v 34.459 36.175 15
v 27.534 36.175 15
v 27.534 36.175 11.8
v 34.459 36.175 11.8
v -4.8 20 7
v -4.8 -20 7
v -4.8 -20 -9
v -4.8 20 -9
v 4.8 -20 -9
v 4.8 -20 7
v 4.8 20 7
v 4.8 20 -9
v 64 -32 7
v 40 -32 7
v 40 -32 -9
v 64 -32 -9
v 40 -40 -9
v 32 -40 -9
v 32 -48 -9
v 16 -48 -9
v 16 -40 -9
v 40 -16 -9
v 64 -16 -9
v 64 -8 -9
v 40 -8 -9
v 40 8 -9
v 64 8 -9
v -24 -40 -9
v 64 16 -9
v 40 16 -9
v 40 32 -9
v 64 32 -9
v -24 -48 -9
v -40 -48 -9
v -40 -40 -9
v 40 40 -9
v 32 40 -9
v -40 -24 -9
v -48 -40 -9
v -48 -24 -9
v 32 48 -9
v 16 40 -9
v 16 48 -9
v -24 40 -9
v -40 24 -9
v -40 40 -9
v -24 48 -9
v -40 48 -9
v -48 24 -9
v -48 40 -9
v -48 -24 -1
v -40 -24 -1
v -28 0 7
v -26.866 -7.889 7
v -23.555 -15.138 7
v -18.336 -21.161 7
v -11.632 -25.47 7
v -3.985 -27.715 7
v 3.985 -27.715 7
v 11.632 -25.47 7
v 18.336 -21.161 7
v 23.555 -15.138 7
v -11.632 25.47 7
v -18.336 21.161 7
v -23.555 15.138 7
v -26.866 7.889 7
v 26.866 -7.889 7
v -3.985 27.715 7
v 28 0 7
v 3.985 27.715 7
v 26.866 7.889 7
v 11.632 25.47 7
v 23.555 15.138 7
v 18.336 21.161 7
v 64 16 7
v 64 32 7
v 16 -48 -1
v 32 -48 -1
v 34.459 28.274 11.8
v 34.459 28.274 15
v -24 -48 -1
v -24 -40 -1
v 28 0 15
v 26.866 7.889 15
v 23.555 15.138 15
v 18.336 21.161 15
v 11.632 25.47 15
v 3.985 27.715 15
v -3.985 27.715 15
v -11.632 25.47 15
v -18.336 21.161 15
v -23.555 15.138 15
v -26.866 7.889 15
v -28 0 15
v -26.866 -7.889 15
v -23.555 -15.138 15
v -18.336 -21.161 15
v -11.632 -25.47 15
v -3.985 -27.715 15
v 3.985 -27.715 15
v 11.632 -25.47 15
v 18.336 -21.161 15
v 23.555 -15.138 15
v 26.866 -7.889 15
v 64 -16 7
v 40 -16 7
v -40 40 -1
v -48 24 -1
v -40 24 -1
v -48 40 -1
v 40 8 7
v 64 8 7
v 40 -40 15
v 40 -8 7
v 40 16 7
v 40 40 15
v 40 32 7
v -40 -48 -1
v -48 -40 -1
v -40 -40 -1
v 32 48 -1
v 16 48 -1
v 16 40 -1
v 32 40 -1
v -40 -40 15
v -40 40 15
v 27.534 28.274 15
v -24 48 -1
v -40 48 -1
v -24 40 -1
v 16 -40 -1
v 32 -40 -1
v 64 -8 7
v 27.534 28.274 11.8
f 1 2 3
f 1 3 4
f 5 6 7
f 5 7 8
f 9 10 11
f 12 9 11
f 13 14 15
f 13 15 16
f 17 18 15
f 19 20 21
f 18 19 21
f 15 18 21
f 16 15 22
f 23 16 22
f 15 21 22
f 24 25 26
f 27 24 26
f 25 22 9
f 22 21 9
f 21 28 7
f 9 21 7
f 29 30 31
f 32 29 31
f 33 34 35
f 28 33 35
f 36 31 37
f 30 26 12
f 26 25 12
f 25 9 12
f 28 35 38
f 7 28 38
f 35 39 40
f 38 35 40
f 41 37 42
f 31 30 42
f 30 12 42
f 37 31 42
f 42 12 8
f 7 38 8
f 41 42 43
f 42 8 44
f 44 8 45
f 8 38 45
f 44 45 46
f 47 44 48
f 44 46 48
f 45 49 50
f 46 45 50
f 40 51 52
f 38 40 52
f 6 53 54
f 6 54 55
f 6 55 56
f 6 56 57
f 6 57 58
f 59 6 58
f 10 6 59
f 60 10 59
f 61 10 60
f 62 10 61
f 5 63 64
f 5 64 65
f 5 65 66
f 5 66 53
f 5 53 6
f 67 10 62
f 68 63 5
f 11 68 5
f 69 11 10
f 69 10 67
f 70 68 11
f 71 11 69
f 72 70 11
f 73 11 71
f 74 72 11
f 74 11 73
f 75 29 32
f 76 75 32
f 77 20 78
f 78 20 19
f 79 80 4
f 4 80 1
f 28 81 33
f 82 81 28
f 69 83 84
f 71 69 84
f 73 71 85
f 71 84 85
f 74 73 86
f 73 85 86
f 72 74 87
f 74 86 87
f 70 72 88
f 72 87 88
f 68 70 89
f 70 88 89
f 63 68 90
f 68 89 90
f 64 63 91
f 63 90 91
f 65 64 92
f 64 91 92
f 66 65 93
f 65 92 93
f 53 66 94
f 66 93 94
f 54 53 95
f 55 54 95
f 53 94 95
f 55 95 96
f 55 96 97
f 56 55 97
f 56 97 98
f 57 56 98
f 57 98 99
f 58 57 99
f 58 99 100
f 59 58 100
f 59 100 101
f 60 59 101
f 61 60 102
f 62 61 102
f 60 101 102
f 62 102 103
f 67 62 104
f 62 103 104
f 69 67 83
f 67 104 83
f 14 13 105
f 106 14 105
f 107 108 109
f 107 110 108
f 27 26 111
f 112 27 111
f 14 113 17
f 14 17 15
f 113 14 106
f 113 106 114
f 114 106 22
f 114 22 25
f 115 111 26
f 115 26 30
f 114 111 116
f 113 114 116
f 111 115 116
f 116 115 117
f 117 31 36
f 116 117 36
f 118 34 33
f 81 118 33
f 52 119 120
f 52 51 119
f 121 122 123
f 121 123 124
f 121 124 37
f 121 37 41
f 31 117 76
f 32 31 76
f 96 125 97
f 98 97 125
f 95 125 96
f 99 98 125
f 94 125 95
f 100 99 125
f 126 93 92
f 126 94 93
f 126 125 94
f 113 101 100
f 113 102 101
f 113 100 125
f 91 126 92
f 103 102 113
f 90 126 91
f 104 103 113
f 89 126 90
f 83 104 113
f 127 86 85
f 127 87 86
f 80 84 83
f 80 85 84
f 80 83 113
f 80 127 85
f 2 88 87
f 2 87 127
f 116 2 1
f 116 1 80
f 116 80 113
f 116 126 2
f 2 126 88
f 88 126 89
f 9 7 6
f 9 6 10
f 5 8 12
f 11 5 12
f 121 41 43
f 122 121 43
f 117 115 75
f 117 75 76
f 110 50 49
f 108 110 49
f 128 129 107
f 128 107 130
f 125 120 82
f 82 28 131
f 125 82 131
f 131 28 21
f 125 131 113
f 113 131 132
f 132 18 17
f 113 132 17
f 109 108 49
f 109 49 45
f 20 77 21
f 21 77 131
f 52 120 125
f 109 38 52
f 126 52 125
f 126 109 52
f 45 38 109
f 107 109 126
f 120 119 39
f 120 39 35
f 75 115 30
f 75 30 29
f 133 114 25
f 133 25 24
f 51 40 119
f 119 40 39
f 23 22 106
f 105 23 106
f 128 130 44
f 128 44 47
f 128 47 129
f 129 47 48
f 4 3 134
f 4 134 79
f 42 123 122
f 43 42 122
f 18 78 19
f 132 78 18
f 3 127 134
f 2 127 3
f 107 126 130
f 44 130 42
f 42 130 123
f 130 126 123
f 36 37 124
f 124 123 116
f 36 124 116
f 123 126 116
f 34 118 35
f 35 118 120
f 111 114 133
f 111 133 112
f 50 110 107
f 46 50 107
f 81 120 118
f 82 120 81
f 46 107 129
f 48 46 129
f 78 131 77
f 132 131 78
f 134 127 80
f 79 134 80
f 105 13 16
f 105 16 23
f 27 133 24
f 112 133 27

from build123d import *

# Parameters (mm, degrees)
F0_W      = 50
F0_H      = 50
F1_DEPTH  = 15
F2_W      = 6
F2_H      = 25
F3_DEPTH  = 25
F4_W      = 10
F4_H      = 10
F5_DEPTH  = 30
F6_W      = 50
F6_H      = 20
F7_DEPTH  = 30
F9_DEPTH  = 50
F10_DEPTH = 5
F11_R     = 17.5
F11_W     = 6
F11_H     = 25
F12_DEPTH = 5
F11_W_2   = 25
F11_H_2   = 5.1409158856
F11_W_3   = 5
F11_H_3   = 5
F11_H_4   = 30
F13_DEPTH = 25
F14_W     = 6
F14_H     = 6
F15_DEPTH = 20
F16_DEPTH = 15
F11_W_4   = 4.3280106038
F11_H_5   = 4.9385428429
F17_DEPTH = 2
F18_W     = 60
F18_H     = 62
F19_DEPTH = 25
F20_SCALE = 1.6
F21_DEPTH = 4
F22_DEPTH = 4


with BuildPart() as f1:
    # F0 (on Top) → F1 (new body)
    with BuildSketch(Plane.XY):
        Rectangle(F0_W, F0_H)
    extrude(amount=F1_DEPTH)

    # F2 (on face) → F3 (cut)
    with BuildSketch(Plane.XY.offset(15)):
        Rectangle(F2_W, F2_H)
    extrude(amount=-F3_DEPTH, mode=Mode.SUBTRACT)

    # F4 (on face) → F5 (join)
    with BuildSketch(Plane.YZ.offset(25)):
        with Locations((0, 7.5)):
            Rectangle(F4_W, F4_H)
        with Locations((-15, 7.5)):
            Rectangle(F4_W, F4_H)
        with Locations((15, 7.5)):
            Rectangle(F4_W, F4_H)
    extrude(amount=F5_DEPTH)

    # F6 (on face) → F7 (join)
    with BuildSketch(Plane.YZ.offset(55)):
        with Locations((0, 7.5)):
            Rectangle(F6_W, F6_H)
    extrude(amount=F7_DEPTH)

    # F8 (on face) → F9 (cut)
    with BuildSketch(Plane(origin=(0, 25, 0), x_dir=(-1, 0, 0), z_dir=(0, 1, 0))):
        Polygon((-85, -2.5), (-70, 17.5), (-85, 17.5), align=None)
    extrude(amount=-F9_DEPTH, mode=Mode.SUBTRACT)

    # F0 (on Top) → F10 (join)
    with BuildSketch(Plane.XY):
        Polygon((-25, -25), (-25, 25), (25, 25), (25, 30), (-30, 30), (-30, -30), (25, -30), (25, -25), align=None)
    extrude(amount=F10_DEPTH)

    # F11 (on face) → F12 (cut)
    with BuildSketch(Plane.XY.offset(15)):
        Circle(F11_R)
        Rectangle(F11_W, F11_H, mode=Mode.SUBTRACT)
    extrude(amount=-F12_DEPTH, mode=Mode.SUBTRACT)

    # F11 (on face) → F13 (cut)
    with BuildSketch(Plane.XY.offset(15)):
        with Locations((-2.5, -27.5704579428)):
            Rectangle(F11_W_2, F11_H_2)
        with Locations((-27.5, -27.5704579428)):
            Rectangle(F11_W_3, F11_H_2)
        with Locations((22.5, -27.5704579428)):
            Rectangle(F11_W_3, F11_H_2)
        with Locations((22.5, 27.5)):
            Rectangle(F11_W_3, F11_H_3)
        with Locations((-2.5, 27.5)):
            Rectangle(F11_W_2, F11_H_3)
        with Locations((-27.5, 27.5)):
            Rectangle(F11_W_3, F11_H_3)
        with Locations((-27.5, 0)):
            Rectangle(F11_W_3, F11_H_4)
    extrude(amount=-F13_DEPTH, mode=Mode.SUBTRACT)

    # F14 (on face) → F15 (join)
    with BuildSketch(Plane.XY.offset(17.5)):
        with Locations((67, 28)):
            Rectangle(F14_W, F14_H)
        with Locations((67, -28)):
            Rectangle(F14_W, F14_H)
    extrude(amount=-F15_DEPTH)

    # F14 (on face) → F16 (cut)
    with BuildSketch(Plane.XY.offset(17.5)):
        with Locations((67, -28)):
            Rectangle(F14_W, F14_H)
        with Locations((67, 28)):
            Rectangle(F14_W, F14_H)
    extrude(amount=-F16_DEPTH, mode=Mode.SUBTRACT)

    # F11 (on face) → F17 (cut)
    with BuildSketch(Plane.XY.offset(15)):
        with Locations((19.372981973, 20.1403833926)):
            Rectangle(F11_W_4, F11_H_5)
    extrude(amount=-F17_DEPTH, mode=Mode.SUBTRACT)

    # F18 (on face) → F19 (cut)
    with BuildSketch(Plane.XY.offset(17.5)):
        with Locations((70, 0)):
            Rectangle(F18_W, F18_H)
    extrude(amount=-F19_DEPTH, mode=Mode.SUBTRACT)


with BuildPart() as f1_1:
    # F20: moved
    add(f1.part.scale(F20_SCALE).moved(Location((0, 0, -9))))

    # F21 (add): faces of the model
    f21_faces = [f1_1.faces().sort_by_distance(p)[0] for p in [
        (52, 24, -5),
        (52, 0, -5),
        (52, -24, -5),
    ]]
    extrude(f21_faces, amount=F21_DEPTH)

    # F22 (cut): faces of the model
    f22_faces = [f1_1.faces().sort_by_distance(p)[0] for p in [
        (52, 24, 11),
        (52, 0, 11),
        (52, -24, 11),
    ]]
    extrude(f22_faces, amount=-F22_DEPTH, mode=Mode.SUBTRACT)


solid = f1_1.part
